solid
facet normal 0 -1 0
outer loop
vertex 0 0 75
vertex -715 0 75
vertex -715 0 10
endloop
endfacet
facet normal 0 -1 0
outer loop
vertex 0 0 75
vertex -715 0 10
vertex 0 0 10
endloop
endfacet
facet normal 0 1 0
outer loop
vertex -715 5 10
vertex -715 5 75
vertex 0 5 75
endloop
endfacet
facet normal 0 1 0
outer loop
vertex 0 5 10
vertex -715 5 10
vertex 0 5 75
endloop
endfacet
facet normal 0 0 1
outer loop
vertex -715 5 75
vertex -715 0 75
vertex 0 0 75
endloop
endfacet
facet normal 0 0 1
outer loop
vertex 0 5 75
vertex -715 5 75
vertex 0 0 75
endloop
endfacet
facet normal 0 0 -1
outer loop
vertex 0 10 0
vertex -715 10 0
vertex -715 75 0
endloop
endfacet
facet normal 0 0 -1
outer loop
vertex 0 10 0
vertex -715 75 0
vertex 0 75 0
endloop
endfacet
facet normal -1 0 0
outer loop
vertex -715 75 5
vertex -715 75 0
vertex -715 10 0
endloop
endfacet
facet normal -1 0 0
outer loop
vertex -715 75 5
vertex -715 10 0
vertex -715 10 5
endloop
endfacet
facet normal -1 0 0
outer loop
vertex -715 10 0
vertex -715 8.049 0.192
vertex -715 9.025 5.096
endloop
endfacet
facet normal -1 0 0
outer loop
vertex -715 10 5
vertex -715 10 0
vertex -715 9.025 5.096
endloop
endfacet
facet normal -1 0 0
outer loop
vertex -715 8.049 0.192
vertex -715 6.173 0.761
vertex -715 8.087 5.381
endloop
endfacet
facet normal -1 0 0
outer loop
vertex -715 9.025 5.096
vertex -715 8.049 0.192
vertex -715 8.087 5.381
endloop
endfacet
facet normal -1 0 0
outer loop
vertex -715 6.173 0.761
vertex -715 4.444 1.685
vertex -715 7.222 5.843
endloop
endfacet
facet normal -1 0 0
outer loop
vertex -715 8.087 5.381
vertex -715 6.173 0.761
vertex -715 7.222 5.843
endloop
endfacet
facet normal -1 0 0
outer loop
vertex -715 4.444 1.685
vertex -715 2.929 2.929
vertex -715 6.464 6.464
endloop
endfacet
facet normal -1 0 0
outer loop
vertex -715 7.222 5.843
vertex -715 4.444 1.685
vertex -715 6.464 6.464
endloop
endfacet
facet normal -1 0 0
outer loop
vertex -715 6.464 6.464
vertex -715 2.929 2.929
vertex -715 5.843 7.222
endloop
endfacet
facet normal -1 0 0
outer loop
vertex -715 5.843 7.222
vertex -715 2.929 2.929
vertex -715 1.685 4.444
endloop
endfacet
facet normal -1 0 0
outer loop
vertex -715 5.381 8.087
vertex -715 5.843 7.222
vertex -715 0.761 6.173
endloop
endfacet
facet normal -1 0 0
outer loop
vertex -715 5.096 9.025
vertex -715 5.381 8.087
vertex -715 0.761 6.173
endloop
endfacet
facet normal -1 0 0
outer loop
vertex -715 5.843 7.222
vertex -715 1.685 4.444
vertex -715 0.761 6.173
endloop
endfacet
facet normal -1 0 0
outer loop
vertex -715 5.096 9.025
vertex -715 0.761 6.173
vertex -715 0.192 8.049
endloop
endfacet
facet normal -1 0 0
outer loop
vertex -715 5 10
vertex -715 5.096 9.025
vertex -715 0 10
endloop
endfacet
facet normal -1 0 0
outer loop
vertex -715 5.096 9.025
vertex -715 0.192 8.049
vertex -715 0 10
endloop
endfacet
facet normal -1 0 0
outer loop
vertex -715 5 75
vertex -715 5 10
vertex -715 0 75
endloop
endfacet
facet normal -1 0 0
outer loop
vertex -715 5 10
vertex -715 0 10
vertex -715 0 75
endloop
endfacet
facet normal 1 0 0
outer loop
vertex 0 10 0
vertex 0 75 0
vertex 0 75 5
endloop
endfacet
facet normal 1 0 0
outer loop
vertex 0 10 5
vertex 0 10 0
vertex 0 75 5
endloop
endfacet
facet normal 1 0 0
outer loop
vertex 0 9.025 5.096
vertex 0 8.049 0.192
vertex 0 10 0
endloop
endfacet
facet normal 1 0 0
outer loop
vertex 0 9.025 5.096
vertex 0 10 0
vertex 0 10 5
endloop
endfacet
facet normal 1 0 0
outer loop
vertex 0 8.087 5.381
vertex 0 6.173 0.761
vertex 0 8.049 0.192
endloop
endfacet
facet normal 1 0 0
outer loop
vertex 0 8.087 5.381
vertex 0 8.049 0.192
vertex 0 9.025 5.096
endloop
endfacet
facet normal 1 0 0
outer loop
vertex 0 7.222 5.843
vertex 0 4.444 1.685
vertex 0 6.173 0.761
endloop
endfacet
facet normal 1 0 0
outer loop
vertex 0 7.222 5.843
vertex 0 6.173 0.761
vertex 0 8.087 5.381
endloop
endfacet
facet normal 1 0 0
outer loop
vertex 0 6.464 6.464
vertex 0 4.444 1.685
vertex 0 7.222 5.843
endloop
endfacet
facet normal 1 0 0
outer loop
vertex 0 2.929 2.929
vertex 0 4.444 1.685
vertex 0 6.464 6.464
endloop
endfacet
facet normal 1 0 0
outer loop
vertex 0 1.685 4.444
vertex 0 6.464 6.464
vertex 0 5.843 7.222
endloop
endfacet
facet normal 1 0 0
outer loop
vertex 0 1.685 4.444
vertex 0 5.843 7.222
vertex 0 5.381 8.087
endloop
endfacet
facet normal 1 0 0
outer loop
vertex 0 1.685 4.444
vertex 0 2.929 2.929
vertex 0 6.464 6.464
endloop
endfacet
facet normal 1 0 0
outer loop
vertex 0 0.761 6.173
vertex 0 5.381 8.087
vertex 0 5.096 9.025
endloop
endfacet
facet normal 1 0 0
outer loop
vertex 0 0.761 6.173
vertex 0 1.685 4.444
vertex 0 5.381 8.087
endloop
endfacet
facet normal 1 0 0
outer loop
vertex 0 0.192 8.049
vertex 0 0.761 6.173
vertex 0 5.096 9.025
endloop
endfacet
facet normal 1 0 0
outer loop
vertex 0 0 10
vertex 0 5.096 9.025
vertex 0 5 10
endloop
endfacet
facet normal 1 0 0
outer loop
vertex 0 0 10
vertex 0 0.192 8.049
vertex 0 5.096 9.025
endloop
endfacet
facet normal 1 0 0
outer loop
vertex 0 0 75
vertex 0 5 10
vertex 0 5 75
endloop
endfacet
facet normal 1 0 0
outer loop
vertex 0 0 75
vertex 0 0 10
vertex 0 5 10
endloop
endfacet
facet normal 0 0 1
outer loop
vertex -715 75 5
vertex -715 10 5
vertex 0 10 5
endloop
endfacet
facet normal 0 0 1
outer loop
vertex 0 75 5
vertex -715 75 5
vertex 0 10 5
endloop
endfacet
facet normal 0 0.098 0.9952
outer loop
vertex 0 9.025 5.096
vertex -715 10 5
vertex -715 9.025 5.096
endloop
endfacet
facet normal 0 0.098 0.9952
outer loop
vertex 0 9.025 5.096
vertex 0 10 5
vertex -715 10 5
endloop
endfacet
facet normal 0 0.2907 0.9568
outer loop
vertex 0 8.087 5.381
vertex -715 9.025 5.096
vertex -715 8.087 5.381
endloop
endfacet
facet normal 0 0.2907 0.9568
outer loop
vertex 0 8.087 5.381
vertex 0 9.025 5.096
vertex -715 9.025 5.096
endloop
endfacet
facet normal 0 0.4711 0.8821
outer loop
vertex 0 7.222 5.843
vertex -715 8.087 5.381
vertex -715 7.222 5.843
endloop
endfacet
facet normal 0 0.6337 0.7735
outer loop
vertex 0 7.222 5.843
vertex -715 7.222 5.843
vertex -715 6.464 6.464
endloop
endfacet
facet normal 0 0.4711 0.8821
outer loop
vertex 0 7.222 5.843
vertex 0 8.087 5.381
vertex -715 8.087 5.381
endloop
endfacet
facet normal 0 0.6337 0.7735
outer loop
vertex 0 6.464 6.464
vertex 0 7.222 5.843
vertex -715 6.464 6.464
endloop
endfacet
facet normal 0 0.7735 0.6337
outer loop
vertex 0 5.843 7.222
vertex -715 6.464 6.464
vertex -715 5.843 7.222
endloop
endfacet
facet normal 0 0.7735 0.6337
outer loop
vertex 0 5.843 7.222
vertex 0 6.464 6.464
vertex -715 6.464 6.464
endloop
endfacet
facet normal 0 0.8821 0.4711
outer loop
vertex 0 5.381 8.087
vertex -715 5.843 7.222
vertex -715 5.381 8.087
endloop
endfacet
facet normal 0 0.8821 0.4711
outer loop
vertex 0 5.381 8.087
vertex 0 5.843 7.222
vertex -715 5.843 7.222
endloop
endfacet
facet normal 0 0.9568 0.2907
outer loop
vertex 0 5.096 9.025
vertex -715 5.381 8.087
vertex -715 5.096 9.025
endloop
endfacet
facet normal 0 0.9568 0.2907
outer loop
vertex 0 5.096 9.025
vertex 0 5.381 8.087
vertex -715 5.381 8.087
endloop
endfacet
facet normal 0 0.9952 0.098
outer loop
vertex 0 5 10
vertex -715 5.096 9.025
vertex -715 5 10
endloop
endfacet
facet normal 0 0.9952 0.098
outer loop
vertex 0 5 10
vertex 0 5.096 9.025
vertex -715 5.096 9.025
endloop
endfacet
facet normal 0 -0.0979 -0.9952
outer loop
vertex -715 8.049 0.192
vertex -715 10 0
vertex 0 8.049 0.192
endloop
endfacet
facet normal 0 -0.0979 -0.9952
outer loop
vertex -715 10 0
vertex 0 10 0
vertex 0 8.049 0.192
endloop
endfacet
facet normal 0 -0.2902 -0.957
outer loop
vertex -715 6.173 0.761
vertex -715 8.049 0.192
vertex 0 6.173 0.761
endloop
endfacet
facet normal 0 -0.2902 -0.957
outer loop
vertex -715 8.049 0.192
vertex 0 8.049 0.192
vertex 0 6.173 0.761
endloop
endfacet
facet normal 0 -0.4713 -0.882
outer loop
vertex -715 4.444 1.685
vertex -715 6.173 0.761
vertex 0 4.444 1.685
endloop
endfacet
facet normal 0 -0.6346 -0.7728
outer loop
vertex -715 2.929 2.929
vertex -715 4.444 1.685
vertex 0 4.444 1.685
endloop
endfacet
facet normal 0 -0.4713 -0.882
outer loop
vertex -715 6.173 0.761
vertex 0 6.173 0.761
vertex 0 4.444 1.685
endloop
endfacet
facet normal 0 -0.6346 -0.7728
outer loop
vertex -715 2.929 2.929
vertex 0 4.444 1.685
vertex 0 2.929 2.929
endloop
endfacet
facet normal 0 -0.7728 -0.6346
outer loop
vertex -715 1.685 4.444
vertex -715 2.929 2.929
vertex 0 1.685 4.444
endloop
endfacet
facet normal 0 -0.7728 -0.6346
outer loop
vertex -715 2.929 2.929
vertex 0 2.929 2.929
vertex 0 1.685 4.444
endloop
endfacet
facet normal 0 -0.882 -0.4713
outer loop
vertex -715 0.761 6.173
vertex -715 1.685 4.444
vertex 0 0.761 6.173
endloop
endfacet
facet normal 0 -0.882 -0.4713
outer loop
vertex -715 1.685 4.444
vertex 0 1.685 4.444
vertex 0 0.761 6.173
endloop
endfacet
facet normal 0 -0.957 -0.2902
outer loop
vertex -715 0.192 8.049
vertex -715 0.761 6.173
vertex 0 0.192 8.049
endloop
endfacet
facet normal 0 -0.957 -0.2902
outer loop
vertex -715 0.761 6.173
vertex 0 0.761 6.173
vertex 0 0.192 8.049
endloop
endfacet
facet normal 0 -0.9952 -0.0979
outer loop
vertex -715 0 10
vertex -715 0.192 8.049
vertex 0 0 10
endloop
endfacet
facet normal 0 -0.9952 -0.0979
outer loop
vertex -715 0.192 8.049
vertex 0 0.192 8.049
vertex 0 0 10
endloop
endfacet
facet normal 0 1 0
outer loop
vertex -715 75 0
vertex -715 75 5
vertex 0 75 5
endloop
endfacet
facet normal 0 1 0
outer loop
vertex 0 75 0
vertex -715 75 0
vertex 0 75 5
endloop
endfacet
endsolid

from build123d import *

# Parameters (mm, degrees)
F0_W     = 715
F0_H     = 75
F1_DEPTH = 75
F2_R     = 10
F3_T     = -5


with BuildPart() as f1:
    # F0 (on Front) → F1 (new body)
    with BuildSketch(Plane.XZ):
        with Locations((-357.5, 37.5)):
            Rectangle(F0_W, F0_H)
    extrude(amount=-F1_DEPTH)

    # F2
    f2_edges = [f1.edges().sort_by_distance(p)[0] for p in [
        (-357.5, 0, 0),
    ]]
    fillet(f2_edges, radius=F2_R)

    # F3
    f3_openings = [f1.faces().sort_by_distance(p)[0] for p in [
        (-357.5, 37.5, 75),
        (-357.5, 75, 37.5),
        (0, 37.635061, 37.635061),
        (-715, 37.635061, 37.635061),
    ]]
    offset(amount=F3_T, openings=f3_openings)


solid = f1.part
